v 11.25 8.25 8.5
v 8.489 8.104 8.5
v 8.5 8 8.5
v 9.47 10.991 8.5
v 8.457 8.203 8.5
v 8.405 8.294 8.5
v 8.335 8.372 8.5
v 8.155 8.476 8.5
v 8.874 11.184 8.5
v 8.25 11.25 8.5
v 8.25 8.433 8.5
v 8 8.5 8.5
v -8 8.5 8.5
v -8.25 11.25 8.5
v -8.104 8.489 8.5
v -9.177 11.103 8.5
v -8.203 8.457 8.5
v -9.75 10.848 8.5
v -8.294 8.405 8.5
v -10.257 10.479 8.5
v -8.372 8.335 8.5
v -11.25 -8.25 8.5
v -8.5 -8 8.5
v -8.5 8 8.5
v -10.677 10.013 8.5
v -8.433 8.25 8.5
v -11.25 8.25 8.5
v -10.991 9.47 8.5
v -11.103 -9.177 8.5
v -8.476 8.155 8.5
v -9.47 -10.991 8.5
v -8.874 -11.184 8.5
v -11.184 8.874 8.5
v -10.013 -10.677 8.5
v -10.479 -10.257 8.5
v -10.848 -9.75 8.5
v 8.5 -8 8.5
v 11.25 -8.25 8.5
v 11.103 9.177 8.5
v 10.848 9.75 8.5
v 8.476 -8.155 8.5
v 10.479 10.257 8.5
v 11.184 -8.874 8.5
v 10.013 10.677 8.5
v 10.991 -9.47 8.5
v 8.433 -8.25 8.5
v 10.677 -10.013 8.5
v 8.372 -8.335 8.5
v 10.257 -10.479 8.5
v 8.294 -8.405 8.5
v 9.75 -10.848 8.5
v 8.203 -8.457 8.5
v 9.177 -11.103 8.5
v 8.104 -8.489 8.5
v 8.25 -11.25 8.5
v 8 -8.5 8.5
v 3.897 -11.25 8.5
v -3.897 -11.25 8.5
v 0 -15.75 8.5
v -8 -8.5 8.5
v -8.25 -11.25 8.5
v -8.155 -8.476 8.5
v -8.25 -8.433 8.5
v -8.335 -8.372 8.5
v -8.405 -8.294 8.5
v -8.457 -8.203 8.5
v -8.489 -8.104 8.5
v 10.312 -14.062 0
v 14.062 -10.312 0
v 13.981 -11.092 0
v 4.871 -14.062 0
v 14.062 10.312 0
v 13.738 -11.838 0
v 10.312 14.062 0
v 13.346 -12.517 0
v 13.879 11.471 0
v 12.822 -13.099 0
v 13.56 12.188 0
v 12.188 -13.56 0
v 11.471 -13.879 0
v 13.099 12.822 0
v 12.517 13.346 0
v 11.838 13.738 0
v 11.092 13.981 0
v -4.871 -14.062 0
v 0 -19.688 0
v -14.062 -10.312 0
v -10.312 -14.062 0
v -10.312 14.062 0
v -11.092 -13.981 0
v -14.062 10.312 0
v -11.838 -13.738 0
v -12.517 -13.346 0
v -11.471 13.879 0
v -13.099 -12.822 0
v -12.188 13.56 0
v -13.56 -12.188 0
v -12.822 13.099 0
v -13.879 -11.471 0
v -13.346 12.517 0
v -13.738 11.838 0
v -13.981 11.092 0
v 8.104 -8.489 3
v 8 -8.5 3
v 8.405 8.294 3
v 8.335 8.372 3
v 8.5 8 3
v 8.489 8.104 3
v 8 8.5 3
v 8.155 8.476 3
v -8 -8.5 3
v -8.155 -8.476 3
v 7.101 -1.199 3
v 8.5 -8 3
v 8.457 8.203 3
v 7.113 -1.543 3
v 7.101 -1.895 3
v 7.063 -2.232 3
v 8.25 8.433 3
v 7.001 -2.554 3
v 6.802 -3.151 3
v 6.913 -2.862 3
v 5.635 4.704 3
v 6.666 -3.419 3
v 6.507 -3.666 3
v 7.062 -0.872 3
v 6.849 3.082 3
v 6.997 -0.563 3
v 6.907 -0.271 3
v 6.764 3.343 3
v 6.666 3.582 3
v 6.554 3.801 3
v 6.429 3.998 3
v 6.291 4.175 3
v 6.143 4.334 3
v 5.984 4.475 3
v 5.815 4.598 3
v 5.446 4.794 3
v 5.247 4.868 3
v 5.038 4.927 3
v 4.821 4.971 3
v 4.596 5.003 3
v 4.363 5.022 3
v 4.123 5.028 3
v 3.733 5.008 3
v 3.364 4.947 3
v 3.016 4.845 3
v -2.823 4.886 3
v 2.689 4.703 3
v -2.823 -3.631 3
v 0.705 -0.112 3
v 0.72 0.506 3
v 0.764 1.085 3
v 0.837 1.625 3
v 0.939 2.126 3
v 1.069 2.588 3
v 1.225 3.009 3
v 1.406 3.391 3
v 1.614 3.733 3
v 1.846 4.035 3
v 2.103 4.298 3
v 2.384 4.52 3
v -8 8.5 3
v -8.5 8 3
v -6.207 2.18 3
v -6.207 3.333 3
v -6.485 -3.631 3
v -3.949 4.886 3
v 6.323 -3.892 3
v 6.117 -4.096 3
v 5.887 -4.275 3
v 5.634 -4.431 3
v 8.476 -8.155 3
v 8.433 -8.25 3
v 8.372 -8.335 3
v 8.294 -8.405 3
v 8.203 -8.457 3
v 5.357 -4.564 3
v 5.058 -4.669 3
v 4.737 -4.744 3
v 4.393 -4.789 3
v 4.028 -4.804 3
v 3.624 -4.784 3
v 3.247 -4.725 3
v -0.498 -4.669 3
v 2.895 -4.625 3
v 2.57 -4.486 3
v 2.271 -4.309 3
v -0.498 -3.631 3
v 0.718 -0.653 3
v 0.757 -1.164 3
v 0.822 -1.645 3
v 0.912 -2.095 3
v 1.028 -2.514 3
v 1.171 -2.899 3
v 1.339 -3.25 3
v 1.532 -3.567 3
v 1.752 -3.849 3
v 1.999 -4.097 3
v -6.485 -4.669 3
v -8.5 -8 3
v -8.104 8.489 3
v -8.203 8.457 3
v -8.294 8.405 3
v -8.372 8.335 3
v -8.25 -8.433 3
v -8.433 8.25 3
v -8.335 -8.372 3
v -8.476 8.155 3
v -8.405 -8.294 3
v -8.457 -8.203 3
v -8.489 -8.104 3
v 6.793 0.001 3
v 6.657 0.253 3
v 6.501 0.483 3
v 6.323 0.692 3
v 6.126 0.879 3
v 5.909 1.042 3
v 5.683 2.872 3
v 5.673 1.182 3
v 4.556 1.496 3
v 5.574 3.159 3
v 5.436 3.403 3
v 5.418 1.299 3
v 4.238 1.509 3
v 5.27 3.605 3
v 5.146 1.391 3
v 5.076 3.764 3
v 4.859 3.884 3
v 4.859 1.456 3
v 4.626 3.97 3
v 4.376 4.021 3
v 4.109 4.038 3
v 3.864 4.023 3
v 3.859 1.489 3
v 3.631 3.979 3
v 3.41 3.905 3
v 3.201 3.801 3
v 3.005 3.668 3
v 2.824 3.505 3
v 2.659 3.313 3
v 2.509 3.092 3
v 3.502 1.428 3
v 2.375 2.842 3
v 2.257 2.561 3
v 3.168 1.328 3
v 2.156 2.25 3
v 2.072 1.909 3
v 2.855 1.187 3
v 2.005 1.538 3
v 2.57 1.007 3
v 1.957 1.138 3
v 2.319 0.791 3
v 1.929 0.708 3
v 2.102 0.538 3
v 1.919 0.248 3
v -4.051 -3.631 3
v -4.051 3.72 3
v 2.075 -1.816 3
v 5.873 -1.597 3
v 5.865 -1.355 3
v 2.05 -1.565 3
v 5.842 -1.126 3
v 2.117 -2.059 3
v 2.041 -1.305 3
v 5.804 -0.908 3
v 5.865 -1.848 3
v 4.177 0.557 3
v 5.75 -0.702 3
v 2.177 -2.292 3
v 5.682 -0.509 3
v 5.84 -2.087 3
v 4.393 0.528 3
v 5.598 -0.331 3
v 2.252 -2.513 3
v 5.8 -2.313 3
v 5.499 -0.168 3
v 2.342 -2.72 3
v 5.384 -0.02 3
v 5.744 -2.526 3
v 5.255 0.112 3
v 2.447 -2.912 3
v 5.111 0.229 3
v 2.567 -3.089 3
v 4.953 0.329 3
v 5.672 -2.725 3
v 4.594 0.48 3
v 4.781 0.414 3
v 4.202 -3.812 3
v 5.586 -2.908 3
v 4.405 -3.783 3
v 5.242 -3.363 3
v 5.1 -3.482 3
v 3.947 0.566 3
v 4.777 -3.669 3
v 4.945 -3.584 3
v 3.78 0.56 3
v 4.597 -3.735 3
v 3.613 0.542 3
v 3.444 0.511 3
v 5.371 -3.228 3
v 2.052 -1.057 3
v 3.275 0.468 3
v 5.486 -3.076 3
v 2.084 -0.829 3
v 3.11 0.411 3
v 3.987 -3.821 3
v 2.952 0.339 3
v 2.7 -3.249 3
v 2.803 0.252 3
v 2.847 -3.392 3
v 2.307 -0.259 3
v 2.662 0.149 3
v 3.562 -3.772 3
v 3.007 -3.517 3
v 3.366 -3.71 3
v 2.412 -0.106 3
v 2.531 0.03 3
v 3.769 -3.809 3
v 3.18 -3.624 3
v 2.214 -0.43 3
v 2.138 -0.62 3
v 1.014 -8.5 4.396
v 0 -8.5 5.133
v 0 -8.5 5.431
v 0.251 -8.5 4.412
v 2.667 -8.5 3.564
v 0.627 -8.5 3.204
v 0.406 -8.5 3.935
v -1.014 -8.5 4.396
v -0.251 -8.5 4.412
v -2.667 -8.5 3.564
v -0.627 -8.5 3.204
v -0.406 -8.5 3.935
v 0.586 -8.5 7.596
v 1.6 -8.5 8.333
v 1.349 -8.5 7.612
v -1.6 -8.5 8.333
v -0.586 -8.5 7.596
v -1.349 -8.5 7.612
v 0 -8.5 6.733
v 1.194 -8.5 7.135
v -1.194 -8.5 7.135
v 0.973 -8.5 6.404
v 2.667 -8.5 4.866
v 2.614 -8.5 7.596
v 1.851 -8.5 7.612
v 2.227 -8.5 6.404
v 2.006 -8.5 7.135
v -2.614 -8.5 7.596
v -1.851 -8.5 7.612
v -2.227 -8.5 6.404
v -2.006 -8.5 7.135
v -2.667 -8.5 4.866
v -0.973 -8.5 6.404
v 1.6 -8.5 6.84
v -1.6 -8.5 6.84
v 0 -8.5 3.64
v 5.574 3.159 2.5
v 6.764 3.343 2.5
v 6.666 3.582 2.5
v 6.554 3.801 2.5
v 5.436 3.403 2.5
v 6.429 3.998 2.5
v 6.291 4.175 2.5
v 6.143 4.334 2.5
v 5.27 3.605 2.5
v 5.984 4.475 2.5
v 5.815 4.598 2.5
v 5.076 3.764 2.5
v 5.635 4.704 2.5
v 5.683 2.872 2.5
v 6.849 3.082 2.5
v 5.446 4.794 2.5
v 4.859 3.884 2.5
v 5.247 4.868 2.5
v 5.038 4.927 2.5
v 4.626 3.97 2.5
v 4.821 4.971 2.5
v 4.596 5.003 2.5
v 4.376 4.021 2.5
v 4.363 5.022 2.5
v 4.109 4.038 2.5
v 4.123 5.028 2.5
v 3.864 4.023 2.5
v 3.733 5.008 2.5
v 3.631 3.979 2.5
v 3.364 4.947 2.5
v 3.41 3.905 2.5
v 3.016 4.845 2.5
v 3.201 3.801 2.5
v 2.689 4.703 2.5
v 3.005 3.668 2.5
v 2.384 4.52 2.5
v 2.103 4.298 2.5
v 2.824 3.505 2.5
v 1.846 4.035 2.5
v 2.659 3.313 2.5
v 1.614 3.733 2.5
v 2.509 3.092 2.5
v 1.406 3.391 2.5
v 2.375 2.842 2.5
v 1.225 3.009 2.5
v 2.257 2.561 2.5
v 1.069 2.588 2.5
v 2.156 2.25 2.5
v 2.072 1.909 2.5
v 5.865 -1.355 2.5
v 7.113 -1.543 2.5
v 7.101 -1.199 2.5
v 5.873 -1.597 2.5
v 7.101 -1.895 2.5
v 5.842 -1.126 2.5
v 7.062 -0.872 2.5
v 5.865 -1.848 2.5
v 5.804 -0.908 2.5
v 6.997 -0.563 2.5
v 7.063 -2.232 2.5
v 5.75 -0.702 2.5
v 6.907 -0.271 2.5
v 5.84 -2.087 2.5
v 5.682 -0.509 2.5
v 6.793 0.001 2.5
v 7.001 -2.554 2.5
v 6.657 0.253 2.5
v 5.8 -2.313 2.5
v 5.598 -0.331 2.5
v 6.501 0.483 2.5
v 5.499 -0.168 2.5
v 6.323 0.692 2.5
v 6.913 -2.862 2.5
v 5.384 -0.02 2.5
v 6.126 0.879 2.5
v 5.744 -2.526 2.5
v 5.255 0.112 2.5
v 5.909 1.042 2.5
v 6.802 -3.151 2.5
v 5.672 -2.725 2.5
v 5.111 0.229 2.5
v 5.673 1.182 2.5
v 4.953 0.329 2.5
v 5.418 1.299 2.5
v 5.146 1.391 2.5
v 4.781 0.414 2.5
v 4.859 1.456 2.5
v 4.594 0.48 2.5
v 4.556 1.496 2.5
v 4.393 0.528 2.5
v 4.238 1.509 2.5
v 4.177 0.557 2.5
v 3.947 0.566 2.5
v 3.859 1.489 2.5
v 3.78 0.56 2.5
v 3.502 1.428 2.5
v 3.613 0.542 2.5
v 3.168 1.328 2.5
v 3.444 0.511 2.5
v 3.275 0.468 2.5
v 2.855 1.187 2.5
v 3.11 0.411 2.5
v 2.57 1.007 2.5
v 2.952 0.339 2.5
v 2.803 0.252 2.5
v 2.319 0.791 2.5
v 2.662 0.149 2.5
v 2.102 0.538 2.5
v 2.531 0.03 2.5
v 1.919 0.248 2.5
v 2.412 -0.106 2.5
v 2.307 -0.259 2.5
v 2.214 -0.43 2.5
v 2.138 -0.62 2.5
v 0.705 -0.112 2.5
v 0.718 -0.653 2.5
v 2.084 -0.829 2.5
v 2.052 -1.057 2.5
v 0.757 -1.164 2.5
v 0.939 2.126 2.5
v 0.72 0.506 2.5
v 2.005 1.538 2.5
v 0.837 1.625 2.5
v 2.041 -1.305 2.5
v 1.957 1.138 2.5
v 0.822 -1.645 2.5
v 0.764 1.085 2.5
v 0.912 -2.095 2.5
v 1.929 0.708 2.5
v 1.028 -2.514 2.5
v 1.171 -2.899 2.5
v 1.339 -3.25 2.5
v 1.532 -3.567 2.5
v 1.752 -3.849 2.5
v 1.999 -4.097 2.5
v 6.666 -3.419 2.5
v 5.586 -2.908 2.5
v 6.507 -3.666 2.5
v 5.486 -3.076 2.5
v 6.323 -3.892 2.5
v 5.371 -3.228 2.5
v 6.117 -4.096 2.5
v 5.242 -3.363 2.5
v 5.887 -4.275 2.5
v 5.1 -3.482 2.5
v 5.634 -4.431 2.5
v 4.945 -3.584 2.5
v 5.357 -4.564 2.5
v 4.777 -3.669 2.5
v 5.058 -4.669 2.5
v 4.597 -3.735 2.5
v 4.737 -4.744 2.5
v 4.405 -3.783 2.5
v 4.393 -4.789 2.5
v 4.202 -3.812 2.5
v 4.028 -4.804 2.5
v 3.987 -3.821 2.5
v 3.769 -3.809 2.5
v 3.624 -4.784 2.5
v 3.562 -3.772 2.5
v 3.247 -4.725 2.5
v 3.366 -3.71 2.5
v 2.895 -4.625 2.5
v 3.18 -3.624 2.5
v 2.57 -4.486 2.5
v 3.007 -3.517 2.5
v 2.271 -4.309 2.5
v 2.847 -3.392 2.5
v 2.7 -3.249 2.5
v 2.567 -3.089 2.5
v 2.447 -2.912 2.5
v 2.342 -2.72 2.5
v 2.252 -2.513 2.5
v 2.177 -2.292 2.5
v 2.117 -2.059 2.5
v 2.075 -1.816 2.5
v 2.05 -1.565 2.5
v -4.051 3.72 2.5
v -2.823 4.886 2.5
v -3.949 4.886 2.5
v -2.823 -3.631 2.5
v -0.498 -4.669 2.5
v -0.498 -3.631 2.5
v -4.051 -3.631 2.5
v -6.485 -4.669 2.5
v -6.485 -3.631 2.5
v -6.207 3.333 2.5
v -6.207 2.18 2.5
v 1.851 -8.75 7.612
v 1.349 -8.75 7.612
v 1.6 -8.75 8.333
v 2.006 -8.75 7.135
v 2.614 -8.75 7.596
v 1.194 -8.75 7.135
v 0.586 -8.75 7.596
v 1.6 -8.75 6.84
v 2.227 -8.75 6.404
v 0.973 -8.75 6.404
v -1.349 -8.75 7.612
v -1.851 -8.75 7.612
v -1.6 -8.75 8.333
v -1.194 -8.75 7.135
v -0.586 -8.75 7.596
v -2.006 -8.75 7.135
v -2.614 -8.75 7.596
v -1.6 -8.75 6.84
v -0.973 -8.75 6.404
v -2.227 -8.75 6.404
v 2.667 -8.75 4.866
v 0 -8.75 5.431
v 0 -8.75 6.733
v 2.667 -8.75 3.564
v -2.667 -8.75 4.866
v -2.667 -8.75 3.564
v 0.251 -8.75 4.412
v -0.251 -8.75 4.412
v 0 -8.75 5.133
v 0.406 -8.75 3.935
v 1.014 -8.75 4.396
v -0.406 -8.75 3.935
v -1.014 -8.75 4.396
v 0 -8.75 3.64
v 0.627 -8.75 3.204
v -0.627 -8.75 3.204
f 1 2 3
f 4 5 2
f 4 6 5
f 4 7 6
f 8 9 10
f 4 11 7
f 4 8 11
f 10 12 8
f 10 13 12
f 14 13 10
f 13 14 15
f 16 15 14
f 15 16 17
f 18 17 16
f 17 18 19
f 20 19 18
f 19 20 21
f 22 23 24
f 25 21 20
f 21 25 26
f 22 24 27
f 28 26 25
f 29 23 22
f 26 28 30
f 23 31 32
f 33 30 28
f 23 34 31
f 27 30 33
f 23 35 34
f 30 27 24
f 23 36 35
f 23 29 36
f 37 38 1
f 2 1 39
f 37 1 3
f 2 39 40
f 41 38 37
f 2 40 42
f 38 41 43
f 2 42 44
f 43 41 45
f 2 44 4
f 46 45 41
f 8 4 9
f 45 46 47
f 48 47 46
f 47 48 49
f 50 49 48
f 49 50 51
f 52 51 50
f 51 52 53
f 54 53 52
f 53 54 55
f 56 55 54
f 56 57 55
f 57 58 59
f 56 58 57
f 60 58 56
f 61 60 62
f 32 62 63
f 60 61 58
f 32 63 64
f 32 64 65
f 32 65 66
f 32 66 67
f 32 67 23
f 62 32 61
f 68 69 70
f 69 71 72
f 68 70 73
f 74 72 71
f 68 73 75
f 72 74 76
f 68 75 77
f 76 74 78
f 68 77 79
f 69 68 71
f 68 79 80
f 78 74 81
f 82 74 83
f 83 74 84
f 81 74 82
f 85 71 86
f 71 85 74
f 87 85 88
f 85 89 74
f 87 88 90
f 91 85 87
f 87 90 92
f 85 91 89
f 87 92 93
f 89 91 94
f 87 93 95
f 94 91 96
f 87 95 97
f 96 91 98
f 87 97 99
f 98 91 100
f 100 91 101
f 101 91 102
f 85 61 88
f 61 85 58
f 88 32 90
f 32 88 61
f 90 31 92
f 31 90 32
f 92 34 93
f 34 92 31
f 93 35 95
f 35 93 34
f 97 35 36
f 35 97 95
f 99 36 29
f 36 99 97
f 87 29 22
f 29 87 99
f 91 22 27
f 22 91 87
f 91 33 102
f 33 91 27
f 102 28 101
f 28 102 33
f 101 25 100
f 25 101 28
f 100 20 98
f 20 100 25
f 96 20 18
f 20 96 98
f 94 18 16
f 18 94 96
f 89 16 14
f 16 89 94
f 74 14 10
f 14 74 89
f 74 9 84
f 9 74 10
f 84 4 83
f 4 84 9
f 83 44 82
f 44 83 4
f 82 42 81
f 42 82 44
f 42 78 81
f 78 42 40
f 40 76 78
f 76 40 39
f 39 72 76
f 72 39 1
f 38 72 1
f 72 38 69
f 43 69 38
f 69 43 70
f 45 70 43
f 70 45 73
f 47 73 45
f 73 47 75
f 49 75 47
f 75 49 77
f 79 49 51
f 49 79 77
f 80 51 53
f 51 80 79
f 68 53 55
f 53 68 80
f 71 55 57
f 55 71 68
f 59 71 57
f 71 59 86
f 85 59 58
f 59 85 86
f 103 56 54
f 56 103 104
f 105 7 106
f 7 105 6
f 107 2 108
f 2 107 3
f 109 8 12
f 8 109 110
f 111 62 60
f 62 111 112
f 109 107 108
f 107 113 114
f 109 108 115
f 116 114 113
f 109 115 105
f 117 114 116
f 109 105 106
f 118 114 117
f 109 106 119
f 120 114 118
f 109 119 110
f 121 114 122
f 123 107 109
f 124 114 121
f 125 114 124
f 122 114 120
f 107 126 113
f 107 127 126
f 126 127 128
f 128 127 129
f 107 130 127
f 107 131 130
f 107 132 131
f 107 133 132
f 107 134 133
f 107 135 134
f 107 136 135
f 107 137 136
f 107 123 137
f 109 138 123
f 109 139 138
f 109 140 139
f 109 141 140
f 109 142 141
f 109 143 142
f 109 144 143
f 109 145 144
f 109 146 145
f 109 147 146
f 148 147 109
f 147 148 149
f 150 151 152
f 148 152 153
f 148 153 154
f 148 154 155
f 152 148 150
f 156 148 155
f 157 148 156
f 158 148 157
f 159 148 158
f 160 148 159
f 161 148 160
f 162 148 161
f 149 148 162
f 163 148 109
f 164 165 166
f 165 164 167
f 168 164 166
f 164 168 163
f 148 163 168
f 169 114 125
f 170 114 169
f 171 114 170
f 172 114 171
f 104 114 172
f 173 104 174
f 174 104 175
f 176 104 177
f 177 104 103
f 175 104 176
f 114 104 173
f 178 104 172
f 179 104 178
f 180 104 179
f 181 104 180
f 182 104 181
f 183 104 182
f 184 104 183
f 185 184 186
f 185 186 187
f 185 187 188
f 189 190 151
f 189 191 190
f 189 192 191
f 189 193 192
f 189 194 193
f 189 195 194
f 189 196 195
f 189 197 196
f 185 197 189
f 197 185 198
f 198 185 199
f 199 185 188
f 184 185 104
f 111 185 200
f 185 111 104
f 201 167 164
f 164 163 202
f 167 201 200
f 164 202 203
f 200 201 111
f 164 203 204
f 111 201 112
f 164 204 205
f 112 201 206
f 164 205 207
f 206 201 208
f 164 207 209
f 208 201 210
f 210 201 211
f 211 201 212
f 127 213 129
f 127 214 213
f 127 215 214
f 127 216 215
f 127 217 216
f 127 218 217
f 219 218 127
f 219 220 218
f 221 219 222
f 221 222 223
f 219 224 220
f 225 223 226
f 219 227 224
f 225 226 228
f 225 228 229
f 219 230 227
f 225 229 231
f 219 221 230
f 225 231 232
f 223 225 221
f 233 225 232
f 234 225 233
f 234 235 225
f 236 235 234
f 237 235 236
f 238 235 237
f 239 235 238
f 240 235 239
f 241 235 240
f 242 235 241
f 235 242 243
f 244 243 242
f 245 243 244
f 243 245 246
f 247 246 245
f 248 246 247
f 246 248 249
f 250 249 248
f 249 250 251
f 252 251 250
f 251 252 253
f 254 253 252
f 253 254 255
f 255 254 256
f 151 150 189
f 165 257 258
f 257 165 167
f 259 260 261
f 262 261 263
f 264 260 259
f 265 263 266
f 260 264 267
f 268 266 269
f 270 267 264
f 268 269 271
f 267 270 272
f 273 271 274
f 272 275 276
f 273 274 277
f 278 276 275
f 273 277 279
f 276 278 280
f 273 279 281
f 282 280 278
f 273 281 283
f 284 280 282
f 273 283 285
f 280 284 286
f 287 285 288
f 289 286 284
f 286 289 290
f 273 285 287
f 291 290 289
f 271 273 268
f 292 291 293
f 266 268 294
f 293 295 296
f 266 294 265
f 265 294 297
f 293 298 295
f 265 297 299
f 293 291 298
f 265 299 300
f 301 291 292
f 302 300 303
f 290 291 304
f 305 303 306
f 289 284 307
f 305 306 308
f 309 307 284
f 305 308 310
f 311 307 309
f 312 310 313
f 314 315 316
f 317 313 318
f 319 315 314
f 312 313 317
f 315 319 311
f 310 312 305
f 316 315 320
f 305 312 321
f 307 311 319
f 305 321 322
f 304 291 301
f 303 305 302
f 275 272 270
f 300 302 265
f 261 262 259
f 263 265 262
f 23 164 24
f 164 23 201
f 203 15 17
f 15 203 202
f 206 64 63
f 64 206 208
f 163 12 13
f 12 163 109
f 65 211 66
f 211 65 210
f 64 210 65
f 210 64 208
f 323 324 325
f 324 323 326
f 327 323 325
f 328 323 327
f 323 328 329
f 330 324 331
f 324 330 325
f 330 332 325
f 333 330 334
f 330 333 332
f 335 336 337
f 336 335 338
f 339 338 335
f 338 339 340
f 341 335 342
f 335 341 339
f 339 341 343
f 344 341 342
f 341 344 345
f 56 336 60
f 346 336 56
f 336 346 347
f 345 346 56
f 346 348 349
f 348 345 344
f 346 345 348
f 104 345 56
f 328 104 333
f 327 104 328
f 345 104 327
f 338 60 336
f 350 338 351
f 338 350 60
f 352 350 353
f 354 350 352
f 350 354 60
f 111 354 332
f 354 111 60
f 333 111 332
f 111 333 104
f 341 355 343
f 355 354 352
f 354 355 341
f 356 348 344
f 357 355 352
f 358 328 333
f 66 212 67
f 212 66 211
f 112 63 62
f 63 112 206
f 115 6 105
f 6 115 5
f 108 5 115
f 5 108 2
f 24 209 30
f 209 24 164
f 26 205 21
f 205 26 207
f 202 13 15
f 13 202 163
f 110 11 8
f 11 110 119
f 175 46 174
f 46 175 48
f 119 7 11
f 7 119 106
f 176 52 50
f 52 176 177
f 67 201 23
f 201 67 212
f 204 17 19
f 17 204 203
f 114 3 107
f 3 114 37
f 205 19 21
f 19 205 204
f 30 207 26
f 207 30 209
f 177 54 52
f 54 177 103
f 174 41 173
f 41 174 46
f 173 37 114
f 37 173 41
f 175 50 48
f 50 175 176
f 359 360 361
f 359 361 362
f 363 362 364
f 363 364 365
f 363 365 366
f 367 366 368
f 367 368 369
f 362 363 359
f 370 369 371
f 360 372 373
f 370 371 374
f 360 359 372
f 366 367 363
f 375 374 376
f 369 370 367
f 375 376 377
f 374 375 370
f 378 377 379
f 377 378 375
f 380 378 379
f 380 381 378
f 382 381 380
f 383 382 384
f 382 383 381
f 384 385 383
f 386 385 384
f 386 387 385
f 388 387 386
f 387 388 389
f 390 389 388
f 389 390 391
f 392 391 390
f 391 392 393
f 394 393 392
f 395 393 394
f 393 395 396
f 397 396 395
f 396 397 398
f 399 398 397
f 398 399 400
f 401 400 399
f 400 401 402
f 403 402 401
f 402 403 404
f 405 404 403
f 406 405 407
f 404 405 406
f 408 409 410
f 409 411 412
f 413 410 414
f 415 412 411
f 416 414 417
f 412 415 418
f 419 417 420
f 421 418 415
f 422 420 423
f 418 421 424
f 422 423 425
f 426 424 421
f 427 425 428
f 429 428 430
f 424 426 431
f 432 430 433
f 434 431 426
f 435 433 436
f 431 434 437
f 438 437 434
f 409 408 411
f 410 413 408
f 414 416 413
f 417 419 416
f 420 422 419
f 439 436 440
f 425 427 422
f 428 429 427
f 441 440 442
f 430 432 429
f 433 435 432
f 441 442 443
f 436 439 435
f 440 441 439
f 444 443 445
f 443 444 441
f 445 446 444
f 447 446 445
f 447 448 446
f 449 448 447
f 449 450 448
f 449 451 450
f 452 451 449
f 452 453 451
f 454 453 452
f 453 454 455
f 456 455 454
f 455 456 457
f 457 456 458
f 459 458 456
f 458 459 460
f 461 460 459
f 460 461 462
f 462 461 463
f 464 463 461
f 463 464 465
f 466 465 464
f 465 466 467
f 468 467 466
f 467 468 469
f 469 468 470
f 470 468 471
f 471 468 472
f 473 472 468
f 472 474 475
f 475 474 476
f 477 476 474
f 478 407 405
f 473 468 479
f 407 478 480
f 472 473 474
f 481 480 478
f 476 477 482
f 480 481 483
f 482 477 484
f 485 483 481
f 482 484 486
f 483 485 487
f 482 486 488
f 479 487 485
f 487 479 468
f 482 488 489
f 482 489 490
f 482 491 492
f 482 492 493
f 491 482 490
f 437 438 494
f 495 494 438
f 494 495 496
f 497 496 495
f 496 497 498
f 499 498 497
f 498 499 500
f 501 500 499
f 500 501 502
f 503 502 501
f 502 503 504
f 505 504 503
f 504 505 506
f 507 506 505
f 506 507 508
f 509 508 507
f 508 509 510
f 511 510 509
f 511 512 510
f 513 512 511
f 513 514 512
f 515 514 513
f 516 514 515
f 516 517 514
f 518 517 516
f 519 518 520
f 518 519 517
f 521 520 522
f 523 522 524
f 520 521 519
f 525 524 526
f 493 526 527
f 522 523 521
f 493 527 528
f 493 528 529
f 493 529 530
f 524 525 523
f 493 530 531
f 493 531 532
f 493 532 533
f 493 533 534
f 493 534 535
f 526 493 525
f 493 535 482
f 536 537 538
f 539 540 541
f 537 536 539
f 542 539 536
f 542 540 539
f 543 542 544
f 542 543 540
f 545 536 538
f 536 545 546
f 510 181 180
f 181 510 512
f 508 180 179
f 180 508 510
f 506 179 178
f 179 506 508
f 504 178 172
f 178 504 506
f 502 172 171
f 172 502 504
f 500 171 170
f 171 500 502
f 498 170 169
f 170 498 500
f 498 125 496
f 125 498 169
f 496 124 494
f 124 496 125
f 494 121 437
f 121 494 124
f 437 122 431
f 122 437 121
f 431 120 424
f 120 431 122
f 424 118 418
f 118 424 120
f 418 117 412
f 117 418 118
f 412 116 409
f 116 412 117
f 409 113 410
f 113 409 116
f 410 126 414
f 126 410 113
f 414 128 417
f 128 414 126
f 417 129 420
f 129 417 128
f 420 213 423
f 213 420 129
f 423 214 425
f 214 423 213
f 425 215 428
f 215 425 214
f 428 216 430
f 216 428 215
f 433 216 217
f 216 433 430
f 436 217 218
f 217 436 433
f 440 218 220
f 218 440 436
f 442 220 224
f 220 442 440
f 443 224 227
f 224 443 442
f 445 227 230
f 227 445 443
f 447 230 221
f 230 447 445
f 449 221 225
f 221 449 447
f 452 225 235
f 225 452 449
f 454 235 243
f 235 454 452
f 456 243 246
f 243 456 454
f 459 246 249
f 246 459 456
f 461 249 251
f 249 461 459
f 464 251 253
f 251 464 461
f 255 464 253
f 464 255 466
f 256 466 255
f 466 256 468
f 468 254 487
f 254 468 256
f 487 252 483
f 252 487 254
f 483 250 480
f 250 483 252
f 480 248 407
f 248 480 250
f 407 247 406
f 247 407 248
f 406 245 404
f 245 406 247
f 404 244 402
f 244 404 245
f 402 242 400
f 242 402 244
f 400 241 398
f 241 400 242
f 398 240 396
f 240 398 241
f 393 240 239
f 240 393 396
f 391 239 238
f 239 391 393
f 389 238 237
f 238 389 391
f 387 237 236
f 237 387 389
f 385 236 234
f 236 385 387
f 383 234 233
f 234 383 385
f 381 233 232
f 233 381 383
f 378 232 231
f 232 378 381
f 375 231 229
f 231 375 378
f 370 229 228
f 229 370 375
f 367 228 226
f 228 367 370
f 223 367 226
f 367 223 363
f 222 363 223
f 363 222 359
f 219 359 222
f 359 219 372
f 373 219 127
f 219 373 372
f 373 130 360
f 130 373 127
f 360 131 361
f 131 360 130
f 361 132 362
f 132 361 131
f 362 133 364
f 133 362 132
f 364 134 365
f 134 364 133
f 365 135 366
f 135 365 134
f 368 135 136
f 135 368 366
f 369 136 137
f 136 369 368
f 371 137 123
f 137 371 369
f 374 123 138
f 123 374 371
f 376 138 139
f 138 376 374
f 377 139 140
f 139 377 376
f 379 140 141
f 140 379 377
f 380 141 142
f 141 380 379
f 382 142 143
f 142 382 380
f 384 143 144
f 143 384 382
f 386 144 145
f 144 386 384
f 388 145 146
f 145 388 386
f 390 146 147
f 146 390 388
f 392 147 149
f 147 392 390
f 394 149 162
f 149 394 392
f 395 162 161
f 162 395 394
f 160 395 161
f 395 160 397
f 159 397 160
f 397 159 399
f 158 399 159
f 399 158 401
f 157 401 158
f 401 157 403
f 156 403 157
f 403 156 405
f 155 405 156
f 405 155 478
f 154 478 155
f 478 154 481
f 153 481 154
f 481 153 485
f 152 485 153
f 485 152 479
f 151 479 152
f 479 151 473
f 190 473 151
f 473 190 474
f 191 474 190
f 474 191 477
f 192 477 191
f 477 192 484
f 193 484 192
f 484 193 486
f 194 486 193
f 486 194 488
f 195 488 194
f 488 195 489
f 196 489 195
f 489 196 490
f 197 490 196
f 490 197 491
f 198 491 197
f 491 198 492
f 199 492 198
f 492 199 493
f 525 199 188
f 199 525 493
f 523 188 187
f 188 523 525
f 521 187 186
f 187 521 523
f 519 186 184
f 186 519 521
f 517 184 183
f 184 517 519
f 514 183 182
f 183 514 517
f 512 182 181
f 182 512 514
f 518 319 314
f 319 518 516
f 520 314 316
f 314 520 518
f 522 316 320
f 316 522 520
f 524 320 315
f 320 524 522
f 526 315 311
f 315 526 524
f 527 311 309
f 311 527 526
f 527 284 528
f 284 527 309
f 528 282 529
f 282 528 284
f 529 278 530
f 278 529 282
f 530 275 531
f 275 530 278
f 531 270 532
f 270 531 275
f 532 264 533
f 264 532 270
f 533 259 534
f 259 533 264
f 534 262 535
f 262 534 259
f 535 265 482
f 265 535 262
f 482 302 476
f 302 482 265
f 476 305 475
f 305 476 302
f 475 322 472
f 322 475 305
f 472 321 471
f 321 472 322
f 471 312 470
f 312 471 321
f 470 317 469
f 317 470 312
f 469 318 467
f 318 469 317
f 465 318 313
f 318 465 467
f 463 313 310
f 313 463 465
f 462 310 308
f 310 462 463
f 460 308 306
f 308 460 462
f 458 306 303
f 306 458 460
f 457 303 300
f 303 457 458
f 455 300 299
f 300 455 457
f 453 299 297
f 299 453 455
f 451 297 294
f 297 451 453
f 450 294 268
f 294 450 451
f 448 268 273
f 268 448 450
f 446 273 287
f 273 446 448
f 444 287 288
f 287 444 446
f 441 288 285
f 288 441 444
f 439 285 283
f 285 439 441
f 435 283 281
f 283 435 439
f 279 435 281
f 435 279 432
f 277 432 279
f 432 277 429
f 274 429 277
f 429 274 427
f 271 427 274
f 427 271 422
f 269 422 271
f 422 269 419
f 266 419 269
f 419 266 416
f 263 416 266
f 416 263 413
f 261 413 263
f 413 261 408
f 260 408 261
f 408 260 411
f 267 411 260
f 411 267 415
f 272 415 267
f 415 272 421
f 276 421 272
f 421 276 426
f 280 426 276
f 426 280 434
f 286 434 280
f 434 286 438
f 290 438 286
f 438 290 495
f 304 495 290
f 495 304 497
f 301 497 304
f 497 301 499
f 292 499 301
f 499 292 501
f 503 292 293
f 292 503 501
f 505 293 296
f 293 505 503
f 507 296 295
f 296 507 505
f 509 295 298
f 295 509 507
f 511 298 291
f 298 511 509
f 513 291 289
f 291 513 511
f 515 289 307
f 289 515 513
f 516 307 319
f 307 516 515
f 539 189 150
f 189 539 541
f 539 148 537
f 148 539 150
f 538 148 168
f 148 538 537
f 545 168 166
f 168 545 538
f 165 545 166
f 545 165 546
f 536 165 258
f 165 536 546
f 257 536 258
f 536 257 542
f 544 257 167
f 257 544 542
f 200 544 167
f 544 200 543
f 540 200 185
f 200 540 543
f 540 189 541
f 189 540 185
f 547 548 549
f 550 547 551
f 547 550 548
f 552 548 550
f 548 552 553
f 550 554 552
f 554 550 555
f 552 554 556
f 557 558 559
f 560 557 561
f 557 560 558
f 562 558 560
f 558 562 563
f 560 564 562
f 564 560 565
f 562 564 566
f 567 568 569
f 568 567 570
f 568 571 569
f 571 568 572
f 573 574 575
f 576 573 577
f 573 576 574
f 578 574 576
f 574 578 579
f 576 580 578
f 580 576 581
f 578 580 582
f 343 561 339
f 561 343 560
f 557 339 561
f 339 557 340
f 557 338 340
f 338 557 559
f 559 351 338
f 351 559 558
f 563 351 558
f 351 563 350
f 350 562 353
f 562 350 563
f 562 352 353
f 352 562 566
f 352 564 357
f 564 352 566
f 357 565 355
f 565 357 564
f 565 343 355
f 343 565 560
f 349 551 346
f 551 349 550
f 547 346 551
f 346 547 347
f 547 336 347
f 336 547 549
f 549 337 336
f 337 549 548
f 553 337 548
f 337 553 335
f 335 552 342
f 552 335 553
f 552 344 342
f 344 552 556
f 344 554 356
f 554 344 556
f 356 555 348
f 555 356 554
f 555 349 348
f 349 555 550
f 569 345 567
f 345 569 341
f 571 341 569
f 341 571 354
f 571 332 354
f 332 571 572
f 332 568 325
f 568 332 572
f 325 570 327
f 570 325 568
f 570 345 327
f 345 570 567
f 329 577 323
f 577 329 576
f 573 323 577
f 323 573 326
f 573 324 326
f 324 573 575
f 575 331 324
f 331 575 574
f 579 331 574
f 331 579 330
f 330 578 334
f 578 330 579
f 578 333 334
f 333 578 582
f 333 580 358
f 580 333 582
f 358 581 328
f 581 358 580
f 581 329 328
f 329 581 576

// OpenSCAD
// Cubic Dice Holder

//Size of die in mm
Size=16;
//Normally want to give the die some room to slide in and out easily but maybe you have a different idea
Fit=0.5; //[0:Tight,0.25:Snug,0.5:Loose]
//Mark the bottom of the well with the die size?
Tagged=1; //[0:No,1:Yes]
//Thickness of the wall at the top of the die holder.
WallThickness=3;
//Add an arrow to the south side as an indicator.
Arrow=2; //[0:None,1:Style 1, 2:Style 2]
// Hard or rounded corners
CornerStyle=0;//[0:Round,1:Hard]

DieSize=Size+Fit;

/*
difference(){
 union(){
  linear_extrude(height=DieSize*2,scale=0) {
   union(){
    intersection(){
     square(DieSize+4*WallThickness,center=true);
     rotate([0,0,45]) square((DieSize+6*WallThickness)*1.0, center=true);
    }
    if (Arrow==2){
     translate([0,-DieSize/2-WallThickness*2.5,0]) rotate([0,0,-90]) scale([1,1.5,1]) circle(r=WallThickness,$fn=3); 
    }
   }
  }
  if (Arrow==1){
   linear_extrude(height=DieSize,scale=0) translate([0,-DieSize/2-WallThickness*2.5,0]) rotate([0,0,-90]) scale([1,1.5,1]) circle(r=WallThickness,$fn=3); 
  }
 }
 translate([0,0,DieSize/2+WallThickness]) cube(DieSize, center=true);
 translate([0,0,DieSize*1.33+WallThickness]) cube(DieSize*2,center=true);
 if (Tagged) translate([0,0,WallThickness]) linear_extrude(height=1, center=true) text(str(Size), size=Size/16*10, halign="center", valign="center");
}
*/

HeightFactor=3;

function from_polar(r=1,theta=60) = [r*cos(theta),r*sin(theta)];

module star_5(radius=10,inner=0.4){
 polygon([
  from_polar(radius,0),
  from_polar(radius*inner,36),
  from_polar(radius,72),
  from_polar(radius*inner,72+36),
  from_polar(radius,72*2),
  from_polar(radius*inner,72*2+36),
  from_polar(radius,72*3),
  from_polar(radius*inner,72*3+36),
  from_polar(radius,72*4),
  from_polar(radius*inner,72*4+36)]
 );
}

module CCTag2D(Size=20, Border=true){
 BorderWidth=(Size>=20)&&Border?Size/20:0;
 ESize=Size-4*BorderWidth;
 StarSize=ESize/5;
 ChevronWidth=ESize/5;
 ChevronAngle=35;
 
 intersection(){
  union(){
   // actual tag elements:
   translate([0,-ESize/2+StarSize,0]) rotate([0,0,90]) star_5(StarSize);
   translate([-ESize/2+StarSize,ESize/2-StarSize,0]) rotate([0,0,90]) star_5(StarSize);
   translate([ESize/2-StarSize,ESize/2-StarSize,0]) rotate([0,0,90]) star_5(StarSize);
   translate([0,ChevronWidth,0]) for (i=[0,1]) mirror([i,0,0]) rotate([0,0,-ChevronAngle]) translate([0,-ChevronWidth]) square([ESize,ChevronWidth]);
  }
  square(ESize,center=true);
 }
 if (BorderWidth){
  difference(){
   square(Size,center=true);
   square(Size-BorderWidth*2,center=true);
  }
 }
}

$fn=30;
difference(){
 union(){
  translate([0,0,DieSize/HeightFactor+WallThickness])
   rotate([180,0,180])
    linear_extrude(height=DieSize/HeightFactor+WallThickness, scale=1.25){
     if (CornerStyle){
      offset(delta=WallThickness,chamfer=true) square(DieSize,center=true);
     }
     else {
      offset(r=WallThickness,chamfer=true) square(DieSize,center=true);
     }
     if (Arrow==2)
      translate([0,-DieSize/2-WallThickness*1.5,0]) rotate([0,0,-90]) scale([1,1.5,1]) circle(r=WallThickness,$fn=3); 
    }
   if (Arrow==1){
    intersection(){
     linear_extrude(height=DieSize,scale=0) translate([0,-DieSize/2-WallThickness*2.5,0]) rotate([0,0,-90]) scale([1,1.5,1]) circle(r=WallThickness,$fn=3); 
     cube([DieSize*2,DieSize*3,DieSize], center=true);
    }
   }
  }

 //Cutouts:
 translate([0,0,WallThickness]) linear_extrude(height=DieSize) 
  if (CornerStyle){
   offset(delta=Fit, chamfer=true) square(Size,center=true);
  }
  else{
   offset(r=Fit, chamfer=true) square(Size,center=true);
  }
  if (Tagged) translate([0,0,WallThickness]) linear_extrude(height=1, center=true) text(str(round(Size)), size=Size/16*10, halign="center", valign="center");
  translate([0,-Size/2-Fit,Size/HeightFactor/2+WallThickness]) rotate([90,0,0]) linear_extrude(height=0.5,center=true) CCTag2D(Size/HeightFactor);
}
